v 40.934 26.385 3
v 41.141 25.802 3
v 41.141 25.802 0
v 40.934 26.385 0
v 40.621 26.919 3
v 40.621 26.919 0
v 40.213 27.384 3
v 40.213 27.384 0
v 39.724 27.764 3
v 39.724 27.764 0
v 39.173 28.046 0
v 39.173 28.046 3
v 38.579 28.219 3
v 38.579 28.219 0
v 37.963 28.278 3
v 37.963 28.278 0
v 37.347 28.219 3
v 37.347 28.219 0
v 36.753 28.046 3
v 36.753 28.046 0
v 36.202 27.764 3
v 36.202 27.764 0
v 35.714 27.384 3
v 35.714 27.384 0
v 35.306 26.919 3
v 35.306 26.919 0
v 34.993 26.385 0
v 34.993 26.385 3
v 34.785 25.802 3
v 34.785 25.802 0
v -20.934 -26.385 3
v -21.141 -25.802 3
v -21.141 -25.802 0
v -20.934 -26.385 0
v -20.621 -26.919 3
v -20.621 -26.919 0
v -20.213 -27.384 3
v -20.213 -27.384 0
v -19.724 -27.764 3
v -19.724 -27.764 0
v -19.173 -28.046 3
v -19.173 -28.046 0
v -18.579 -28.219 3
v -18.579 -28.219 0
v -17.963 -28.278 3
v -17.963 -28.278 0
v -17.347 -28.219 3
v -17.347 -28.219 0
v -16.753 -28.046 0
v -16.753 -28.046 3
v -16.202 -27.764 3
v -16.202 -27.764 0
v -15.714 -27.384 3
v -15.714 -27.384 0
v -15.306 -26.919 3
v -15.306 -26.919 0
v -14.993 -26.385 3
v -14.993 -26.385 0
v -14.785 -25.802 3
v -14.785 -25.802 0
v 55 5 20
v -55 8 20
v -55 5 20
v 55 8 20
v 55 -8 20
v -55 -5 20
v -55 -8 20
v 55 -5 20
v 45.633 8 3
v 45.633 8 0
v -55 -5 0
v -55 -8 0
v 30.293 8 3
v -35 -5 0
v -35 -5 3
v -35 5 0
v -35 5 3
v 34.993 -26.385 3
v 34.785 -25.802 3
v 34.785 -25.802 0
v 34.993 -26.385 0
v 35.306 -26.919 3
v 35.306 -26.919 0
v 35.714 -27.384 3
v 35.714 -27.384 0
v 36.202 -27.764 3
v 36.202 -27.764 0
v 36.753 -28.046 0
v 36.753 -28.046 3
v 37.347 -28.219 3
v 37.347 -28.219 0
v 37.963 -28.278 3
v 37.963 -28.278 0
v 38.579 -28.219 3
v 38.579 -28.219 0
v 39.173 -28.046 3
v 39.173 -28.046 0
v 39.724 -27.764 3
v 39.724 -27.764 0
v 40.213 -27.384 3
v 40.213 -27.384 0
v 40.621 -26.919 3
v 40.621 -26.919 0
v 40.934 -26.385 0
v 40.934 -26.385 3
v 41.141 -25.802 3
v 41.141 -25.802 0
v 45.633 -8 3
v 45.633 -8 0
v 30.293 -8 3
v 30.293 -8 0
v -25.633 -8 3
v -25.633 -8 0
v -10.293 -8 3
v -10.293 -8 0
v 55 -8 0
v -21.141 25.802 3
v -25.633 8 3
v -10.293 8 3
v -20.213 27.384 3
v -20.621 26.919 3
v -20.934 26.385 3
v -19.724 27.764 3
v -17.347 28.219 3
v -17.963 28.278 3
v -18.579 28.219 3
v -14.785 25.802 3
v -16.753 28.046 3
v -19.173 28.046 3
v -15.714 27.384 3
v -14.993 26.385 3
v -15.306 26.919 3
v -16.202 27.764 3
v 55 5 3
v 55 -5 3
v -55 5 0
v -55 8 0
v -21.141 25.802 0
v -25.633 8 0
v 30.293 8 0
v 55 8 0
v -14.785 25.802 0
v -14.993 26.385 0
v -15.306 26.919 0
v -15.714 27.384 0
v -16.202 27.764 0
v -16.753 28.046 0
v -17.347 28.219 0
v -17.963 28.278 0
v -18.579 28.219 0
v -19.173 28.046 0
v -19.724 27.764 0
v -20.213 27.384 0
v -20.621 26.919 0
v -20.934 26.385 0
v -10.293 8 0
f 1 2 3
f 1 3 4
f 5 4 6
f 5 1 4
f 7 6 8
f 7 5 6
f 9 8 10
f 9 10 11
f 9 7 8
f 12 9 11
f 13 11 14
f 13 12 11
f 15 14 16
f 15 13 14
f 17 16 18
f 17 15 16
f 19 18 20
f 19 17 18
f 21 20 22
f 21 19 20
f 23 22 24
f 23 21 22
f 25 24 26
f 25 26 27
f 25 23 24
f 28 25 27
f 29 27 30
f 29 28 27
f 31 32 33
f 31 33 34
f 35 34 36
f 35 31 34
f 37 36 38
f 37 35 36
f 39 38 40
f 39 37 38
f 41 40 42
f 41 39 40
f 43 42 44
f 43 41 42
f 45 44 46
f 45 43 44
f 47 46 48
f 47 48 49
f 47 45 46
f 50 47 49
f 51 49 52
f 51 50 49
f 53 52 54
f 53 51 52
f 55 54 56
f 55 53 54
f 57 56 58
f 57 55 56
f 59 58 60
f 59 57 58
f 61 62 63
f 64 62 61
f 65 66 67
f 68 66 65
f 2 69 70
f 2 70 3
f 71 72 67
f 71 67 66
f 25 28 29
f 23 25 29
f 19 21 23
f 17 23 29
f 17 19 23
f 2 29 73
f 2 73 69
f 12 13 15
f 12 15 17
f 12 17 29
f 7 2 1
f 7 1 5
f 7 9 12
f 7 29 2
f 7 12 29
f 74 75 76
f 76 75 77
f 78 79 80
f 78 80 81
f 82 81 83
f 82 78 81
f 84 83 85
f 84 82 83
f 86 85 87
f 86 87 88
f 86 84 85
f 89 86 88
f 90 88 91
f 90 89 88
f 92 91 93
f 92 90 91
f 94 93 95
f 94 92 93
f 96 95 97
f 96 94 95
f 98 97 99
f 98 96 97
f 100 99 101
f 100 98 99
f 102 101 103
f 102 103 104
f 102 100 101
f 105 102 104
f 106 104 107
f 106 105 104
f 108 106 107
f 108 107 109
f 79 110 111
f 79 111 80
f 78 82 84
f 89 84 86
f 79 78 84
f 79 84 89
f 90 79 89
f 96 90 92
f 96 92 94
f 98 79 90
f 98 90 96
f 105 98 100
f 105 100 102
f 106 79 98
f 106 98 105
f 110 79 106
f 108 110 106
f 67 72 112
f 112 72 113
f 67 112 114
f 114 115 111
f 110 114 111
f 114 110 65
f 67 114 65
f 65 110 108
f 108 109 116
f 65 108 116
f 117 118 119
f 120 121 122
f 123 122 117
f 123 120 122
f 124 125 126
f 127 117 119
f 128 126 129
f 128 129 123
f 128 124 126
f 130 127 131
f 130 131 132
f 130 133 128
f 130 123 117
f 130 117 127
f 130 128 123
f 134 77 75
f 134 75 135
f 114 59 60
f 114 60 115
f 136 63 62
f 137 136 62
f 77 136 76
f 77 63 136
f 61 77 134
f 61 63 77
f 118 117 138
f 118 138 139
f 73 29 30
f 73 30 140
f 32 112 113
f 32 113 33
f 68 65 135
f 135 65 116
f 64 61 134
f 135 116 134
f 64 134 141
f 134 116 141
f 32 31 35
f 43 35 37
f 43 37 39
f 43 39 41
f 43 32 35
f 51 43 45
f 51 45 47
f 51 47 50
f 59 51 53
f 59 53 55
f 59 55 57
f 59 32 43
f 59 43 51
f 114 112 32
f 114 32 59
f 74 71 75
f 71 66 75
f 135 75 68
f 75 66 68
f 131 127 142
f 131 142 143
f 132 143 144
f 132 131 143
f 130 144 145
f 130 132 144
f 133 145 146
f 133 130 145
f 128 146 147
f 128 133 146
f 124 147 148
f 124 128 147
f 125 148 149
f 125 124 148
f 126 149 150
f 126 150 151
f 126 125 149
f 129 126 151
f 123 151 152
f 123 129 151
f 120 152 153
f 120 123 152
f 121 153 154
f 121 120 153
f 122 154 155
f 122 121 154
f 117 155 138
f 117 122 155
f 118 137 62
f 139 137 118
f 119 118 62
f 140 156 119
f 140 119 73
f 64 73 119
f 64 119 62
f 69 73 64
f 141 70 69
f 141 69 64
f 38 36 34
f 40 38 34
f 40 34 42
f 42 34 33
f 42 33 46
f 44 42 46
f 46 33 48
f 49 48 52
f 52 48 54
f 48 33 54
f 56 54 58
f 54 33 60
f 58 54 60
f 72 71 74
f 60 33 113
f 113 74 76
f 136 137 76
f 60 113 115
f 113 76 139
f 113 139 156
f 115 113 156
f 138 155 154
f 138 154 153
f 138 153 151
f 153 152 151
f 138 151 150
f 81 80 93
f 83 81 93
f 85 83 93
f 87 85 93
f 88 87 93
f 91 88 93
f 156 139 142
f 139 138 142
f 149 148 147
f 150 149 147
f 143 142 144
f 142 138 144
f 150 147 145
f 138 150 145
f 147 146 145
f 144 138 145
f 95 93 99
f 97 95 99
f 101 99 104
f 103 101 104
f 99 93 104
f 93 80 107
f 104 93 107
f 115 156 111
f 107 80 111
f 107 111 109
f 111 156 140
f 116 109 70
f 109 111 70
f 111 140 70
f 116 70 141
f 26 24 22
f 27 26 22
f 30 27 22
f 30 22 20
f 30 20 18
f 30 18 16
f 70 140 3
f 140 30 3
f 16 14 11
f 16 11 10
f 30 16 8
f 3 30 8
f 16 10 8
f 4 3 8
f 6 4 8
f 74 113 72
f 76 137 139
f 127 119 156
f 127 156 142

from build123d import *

# Parameters (mm, degrees)
F0_W     = 110
F0_H     = 10
F1_DEPTH = 3
F0_H_2   = 3
F3_DEPTH = 20
F2_W     = 20
F2_H     = 10
F4_DEPTH = 3
F6_DEPTH = 3


with BuildPart() as f1:
    # F0 (on Top) → F1 (new body)
    with BuildSketch(Plane.XY):
        Rectangle(F0_W, F0_H)
    extrude(amount=F1_DEPTH)

    # F0 (on Top) → F3 (join)
    with BuildSketch(Plane.XY):
        with Locations((0, -6.5)):
            Rectangle(F0_W, F0_H_2)
        with Locations((0, 6.5)):
            Rectangle(F0_W, F0_H_2)
    extrude(amount=F3_DEPTH)

    # F2 (on face) → F4 (cut, through all)
    with BuildSketch(Plane.XY.offset(3)):
        with Locations((-45, 0)):
            Rectangle(F2_W, F2_H)
    extrude(amount=-F4_DEPTH, mode=Mode.SUBTRACT)

    # F5 (on face) → F6 (join, through all)
    with BuildSketch(Plane.XY.offset(3)):
        with BuildLine():
            Line((-9.536225, -5), (-26.390179, -5))
            Line((-26.390179, -5), (-21.141226, -25.801912))
            ThreePointArc((-21.141226, -25.801912), (-17.963202, -28.277636), (-14.785178, -25.801912))
            Line((-14.785178, -25.801912), (-9.536225, -5))
        make_face()
        with BuildLine():
            Line((46.390179, -5), (29.536225, -5))
            Line((29.536225, -5), (34.785178, -25.801912))
            ThreePointArc((34.785178, -25.801912), (37.963202, -28.277636), (41.141226, -25.801912))
            Line((41.141226, -25.801912), (46.390179, -5))
        make_face()
        with BuildLine():
            Line((-21.141226, 25.801912), (-26.390179, 5))
            Line((-26.390179, 5), (-9.536225, 5))
            Line((-9.536225, 5), (-14.785178, 25.801912))
            ThreePointArc((-14.785178, 25.801912), (-17.963202, 28.277636), (-21.141226, 25.801912))
        make_face()
        with BuildLine():
            Line((34.785178, 25.801912), (29.536225, 5))
            Line((29.536225, 5), (46.390179, 5))
            Line((46.390179, 5), (41.141226, 25.801912))
            ThreePointArc((41.141226, 25.801912), (37.963202, 28.277636), (34.785178, 25.801912))
        make_face()
    extrude(amount=-F6_DEPTH)


solid = f1.part
